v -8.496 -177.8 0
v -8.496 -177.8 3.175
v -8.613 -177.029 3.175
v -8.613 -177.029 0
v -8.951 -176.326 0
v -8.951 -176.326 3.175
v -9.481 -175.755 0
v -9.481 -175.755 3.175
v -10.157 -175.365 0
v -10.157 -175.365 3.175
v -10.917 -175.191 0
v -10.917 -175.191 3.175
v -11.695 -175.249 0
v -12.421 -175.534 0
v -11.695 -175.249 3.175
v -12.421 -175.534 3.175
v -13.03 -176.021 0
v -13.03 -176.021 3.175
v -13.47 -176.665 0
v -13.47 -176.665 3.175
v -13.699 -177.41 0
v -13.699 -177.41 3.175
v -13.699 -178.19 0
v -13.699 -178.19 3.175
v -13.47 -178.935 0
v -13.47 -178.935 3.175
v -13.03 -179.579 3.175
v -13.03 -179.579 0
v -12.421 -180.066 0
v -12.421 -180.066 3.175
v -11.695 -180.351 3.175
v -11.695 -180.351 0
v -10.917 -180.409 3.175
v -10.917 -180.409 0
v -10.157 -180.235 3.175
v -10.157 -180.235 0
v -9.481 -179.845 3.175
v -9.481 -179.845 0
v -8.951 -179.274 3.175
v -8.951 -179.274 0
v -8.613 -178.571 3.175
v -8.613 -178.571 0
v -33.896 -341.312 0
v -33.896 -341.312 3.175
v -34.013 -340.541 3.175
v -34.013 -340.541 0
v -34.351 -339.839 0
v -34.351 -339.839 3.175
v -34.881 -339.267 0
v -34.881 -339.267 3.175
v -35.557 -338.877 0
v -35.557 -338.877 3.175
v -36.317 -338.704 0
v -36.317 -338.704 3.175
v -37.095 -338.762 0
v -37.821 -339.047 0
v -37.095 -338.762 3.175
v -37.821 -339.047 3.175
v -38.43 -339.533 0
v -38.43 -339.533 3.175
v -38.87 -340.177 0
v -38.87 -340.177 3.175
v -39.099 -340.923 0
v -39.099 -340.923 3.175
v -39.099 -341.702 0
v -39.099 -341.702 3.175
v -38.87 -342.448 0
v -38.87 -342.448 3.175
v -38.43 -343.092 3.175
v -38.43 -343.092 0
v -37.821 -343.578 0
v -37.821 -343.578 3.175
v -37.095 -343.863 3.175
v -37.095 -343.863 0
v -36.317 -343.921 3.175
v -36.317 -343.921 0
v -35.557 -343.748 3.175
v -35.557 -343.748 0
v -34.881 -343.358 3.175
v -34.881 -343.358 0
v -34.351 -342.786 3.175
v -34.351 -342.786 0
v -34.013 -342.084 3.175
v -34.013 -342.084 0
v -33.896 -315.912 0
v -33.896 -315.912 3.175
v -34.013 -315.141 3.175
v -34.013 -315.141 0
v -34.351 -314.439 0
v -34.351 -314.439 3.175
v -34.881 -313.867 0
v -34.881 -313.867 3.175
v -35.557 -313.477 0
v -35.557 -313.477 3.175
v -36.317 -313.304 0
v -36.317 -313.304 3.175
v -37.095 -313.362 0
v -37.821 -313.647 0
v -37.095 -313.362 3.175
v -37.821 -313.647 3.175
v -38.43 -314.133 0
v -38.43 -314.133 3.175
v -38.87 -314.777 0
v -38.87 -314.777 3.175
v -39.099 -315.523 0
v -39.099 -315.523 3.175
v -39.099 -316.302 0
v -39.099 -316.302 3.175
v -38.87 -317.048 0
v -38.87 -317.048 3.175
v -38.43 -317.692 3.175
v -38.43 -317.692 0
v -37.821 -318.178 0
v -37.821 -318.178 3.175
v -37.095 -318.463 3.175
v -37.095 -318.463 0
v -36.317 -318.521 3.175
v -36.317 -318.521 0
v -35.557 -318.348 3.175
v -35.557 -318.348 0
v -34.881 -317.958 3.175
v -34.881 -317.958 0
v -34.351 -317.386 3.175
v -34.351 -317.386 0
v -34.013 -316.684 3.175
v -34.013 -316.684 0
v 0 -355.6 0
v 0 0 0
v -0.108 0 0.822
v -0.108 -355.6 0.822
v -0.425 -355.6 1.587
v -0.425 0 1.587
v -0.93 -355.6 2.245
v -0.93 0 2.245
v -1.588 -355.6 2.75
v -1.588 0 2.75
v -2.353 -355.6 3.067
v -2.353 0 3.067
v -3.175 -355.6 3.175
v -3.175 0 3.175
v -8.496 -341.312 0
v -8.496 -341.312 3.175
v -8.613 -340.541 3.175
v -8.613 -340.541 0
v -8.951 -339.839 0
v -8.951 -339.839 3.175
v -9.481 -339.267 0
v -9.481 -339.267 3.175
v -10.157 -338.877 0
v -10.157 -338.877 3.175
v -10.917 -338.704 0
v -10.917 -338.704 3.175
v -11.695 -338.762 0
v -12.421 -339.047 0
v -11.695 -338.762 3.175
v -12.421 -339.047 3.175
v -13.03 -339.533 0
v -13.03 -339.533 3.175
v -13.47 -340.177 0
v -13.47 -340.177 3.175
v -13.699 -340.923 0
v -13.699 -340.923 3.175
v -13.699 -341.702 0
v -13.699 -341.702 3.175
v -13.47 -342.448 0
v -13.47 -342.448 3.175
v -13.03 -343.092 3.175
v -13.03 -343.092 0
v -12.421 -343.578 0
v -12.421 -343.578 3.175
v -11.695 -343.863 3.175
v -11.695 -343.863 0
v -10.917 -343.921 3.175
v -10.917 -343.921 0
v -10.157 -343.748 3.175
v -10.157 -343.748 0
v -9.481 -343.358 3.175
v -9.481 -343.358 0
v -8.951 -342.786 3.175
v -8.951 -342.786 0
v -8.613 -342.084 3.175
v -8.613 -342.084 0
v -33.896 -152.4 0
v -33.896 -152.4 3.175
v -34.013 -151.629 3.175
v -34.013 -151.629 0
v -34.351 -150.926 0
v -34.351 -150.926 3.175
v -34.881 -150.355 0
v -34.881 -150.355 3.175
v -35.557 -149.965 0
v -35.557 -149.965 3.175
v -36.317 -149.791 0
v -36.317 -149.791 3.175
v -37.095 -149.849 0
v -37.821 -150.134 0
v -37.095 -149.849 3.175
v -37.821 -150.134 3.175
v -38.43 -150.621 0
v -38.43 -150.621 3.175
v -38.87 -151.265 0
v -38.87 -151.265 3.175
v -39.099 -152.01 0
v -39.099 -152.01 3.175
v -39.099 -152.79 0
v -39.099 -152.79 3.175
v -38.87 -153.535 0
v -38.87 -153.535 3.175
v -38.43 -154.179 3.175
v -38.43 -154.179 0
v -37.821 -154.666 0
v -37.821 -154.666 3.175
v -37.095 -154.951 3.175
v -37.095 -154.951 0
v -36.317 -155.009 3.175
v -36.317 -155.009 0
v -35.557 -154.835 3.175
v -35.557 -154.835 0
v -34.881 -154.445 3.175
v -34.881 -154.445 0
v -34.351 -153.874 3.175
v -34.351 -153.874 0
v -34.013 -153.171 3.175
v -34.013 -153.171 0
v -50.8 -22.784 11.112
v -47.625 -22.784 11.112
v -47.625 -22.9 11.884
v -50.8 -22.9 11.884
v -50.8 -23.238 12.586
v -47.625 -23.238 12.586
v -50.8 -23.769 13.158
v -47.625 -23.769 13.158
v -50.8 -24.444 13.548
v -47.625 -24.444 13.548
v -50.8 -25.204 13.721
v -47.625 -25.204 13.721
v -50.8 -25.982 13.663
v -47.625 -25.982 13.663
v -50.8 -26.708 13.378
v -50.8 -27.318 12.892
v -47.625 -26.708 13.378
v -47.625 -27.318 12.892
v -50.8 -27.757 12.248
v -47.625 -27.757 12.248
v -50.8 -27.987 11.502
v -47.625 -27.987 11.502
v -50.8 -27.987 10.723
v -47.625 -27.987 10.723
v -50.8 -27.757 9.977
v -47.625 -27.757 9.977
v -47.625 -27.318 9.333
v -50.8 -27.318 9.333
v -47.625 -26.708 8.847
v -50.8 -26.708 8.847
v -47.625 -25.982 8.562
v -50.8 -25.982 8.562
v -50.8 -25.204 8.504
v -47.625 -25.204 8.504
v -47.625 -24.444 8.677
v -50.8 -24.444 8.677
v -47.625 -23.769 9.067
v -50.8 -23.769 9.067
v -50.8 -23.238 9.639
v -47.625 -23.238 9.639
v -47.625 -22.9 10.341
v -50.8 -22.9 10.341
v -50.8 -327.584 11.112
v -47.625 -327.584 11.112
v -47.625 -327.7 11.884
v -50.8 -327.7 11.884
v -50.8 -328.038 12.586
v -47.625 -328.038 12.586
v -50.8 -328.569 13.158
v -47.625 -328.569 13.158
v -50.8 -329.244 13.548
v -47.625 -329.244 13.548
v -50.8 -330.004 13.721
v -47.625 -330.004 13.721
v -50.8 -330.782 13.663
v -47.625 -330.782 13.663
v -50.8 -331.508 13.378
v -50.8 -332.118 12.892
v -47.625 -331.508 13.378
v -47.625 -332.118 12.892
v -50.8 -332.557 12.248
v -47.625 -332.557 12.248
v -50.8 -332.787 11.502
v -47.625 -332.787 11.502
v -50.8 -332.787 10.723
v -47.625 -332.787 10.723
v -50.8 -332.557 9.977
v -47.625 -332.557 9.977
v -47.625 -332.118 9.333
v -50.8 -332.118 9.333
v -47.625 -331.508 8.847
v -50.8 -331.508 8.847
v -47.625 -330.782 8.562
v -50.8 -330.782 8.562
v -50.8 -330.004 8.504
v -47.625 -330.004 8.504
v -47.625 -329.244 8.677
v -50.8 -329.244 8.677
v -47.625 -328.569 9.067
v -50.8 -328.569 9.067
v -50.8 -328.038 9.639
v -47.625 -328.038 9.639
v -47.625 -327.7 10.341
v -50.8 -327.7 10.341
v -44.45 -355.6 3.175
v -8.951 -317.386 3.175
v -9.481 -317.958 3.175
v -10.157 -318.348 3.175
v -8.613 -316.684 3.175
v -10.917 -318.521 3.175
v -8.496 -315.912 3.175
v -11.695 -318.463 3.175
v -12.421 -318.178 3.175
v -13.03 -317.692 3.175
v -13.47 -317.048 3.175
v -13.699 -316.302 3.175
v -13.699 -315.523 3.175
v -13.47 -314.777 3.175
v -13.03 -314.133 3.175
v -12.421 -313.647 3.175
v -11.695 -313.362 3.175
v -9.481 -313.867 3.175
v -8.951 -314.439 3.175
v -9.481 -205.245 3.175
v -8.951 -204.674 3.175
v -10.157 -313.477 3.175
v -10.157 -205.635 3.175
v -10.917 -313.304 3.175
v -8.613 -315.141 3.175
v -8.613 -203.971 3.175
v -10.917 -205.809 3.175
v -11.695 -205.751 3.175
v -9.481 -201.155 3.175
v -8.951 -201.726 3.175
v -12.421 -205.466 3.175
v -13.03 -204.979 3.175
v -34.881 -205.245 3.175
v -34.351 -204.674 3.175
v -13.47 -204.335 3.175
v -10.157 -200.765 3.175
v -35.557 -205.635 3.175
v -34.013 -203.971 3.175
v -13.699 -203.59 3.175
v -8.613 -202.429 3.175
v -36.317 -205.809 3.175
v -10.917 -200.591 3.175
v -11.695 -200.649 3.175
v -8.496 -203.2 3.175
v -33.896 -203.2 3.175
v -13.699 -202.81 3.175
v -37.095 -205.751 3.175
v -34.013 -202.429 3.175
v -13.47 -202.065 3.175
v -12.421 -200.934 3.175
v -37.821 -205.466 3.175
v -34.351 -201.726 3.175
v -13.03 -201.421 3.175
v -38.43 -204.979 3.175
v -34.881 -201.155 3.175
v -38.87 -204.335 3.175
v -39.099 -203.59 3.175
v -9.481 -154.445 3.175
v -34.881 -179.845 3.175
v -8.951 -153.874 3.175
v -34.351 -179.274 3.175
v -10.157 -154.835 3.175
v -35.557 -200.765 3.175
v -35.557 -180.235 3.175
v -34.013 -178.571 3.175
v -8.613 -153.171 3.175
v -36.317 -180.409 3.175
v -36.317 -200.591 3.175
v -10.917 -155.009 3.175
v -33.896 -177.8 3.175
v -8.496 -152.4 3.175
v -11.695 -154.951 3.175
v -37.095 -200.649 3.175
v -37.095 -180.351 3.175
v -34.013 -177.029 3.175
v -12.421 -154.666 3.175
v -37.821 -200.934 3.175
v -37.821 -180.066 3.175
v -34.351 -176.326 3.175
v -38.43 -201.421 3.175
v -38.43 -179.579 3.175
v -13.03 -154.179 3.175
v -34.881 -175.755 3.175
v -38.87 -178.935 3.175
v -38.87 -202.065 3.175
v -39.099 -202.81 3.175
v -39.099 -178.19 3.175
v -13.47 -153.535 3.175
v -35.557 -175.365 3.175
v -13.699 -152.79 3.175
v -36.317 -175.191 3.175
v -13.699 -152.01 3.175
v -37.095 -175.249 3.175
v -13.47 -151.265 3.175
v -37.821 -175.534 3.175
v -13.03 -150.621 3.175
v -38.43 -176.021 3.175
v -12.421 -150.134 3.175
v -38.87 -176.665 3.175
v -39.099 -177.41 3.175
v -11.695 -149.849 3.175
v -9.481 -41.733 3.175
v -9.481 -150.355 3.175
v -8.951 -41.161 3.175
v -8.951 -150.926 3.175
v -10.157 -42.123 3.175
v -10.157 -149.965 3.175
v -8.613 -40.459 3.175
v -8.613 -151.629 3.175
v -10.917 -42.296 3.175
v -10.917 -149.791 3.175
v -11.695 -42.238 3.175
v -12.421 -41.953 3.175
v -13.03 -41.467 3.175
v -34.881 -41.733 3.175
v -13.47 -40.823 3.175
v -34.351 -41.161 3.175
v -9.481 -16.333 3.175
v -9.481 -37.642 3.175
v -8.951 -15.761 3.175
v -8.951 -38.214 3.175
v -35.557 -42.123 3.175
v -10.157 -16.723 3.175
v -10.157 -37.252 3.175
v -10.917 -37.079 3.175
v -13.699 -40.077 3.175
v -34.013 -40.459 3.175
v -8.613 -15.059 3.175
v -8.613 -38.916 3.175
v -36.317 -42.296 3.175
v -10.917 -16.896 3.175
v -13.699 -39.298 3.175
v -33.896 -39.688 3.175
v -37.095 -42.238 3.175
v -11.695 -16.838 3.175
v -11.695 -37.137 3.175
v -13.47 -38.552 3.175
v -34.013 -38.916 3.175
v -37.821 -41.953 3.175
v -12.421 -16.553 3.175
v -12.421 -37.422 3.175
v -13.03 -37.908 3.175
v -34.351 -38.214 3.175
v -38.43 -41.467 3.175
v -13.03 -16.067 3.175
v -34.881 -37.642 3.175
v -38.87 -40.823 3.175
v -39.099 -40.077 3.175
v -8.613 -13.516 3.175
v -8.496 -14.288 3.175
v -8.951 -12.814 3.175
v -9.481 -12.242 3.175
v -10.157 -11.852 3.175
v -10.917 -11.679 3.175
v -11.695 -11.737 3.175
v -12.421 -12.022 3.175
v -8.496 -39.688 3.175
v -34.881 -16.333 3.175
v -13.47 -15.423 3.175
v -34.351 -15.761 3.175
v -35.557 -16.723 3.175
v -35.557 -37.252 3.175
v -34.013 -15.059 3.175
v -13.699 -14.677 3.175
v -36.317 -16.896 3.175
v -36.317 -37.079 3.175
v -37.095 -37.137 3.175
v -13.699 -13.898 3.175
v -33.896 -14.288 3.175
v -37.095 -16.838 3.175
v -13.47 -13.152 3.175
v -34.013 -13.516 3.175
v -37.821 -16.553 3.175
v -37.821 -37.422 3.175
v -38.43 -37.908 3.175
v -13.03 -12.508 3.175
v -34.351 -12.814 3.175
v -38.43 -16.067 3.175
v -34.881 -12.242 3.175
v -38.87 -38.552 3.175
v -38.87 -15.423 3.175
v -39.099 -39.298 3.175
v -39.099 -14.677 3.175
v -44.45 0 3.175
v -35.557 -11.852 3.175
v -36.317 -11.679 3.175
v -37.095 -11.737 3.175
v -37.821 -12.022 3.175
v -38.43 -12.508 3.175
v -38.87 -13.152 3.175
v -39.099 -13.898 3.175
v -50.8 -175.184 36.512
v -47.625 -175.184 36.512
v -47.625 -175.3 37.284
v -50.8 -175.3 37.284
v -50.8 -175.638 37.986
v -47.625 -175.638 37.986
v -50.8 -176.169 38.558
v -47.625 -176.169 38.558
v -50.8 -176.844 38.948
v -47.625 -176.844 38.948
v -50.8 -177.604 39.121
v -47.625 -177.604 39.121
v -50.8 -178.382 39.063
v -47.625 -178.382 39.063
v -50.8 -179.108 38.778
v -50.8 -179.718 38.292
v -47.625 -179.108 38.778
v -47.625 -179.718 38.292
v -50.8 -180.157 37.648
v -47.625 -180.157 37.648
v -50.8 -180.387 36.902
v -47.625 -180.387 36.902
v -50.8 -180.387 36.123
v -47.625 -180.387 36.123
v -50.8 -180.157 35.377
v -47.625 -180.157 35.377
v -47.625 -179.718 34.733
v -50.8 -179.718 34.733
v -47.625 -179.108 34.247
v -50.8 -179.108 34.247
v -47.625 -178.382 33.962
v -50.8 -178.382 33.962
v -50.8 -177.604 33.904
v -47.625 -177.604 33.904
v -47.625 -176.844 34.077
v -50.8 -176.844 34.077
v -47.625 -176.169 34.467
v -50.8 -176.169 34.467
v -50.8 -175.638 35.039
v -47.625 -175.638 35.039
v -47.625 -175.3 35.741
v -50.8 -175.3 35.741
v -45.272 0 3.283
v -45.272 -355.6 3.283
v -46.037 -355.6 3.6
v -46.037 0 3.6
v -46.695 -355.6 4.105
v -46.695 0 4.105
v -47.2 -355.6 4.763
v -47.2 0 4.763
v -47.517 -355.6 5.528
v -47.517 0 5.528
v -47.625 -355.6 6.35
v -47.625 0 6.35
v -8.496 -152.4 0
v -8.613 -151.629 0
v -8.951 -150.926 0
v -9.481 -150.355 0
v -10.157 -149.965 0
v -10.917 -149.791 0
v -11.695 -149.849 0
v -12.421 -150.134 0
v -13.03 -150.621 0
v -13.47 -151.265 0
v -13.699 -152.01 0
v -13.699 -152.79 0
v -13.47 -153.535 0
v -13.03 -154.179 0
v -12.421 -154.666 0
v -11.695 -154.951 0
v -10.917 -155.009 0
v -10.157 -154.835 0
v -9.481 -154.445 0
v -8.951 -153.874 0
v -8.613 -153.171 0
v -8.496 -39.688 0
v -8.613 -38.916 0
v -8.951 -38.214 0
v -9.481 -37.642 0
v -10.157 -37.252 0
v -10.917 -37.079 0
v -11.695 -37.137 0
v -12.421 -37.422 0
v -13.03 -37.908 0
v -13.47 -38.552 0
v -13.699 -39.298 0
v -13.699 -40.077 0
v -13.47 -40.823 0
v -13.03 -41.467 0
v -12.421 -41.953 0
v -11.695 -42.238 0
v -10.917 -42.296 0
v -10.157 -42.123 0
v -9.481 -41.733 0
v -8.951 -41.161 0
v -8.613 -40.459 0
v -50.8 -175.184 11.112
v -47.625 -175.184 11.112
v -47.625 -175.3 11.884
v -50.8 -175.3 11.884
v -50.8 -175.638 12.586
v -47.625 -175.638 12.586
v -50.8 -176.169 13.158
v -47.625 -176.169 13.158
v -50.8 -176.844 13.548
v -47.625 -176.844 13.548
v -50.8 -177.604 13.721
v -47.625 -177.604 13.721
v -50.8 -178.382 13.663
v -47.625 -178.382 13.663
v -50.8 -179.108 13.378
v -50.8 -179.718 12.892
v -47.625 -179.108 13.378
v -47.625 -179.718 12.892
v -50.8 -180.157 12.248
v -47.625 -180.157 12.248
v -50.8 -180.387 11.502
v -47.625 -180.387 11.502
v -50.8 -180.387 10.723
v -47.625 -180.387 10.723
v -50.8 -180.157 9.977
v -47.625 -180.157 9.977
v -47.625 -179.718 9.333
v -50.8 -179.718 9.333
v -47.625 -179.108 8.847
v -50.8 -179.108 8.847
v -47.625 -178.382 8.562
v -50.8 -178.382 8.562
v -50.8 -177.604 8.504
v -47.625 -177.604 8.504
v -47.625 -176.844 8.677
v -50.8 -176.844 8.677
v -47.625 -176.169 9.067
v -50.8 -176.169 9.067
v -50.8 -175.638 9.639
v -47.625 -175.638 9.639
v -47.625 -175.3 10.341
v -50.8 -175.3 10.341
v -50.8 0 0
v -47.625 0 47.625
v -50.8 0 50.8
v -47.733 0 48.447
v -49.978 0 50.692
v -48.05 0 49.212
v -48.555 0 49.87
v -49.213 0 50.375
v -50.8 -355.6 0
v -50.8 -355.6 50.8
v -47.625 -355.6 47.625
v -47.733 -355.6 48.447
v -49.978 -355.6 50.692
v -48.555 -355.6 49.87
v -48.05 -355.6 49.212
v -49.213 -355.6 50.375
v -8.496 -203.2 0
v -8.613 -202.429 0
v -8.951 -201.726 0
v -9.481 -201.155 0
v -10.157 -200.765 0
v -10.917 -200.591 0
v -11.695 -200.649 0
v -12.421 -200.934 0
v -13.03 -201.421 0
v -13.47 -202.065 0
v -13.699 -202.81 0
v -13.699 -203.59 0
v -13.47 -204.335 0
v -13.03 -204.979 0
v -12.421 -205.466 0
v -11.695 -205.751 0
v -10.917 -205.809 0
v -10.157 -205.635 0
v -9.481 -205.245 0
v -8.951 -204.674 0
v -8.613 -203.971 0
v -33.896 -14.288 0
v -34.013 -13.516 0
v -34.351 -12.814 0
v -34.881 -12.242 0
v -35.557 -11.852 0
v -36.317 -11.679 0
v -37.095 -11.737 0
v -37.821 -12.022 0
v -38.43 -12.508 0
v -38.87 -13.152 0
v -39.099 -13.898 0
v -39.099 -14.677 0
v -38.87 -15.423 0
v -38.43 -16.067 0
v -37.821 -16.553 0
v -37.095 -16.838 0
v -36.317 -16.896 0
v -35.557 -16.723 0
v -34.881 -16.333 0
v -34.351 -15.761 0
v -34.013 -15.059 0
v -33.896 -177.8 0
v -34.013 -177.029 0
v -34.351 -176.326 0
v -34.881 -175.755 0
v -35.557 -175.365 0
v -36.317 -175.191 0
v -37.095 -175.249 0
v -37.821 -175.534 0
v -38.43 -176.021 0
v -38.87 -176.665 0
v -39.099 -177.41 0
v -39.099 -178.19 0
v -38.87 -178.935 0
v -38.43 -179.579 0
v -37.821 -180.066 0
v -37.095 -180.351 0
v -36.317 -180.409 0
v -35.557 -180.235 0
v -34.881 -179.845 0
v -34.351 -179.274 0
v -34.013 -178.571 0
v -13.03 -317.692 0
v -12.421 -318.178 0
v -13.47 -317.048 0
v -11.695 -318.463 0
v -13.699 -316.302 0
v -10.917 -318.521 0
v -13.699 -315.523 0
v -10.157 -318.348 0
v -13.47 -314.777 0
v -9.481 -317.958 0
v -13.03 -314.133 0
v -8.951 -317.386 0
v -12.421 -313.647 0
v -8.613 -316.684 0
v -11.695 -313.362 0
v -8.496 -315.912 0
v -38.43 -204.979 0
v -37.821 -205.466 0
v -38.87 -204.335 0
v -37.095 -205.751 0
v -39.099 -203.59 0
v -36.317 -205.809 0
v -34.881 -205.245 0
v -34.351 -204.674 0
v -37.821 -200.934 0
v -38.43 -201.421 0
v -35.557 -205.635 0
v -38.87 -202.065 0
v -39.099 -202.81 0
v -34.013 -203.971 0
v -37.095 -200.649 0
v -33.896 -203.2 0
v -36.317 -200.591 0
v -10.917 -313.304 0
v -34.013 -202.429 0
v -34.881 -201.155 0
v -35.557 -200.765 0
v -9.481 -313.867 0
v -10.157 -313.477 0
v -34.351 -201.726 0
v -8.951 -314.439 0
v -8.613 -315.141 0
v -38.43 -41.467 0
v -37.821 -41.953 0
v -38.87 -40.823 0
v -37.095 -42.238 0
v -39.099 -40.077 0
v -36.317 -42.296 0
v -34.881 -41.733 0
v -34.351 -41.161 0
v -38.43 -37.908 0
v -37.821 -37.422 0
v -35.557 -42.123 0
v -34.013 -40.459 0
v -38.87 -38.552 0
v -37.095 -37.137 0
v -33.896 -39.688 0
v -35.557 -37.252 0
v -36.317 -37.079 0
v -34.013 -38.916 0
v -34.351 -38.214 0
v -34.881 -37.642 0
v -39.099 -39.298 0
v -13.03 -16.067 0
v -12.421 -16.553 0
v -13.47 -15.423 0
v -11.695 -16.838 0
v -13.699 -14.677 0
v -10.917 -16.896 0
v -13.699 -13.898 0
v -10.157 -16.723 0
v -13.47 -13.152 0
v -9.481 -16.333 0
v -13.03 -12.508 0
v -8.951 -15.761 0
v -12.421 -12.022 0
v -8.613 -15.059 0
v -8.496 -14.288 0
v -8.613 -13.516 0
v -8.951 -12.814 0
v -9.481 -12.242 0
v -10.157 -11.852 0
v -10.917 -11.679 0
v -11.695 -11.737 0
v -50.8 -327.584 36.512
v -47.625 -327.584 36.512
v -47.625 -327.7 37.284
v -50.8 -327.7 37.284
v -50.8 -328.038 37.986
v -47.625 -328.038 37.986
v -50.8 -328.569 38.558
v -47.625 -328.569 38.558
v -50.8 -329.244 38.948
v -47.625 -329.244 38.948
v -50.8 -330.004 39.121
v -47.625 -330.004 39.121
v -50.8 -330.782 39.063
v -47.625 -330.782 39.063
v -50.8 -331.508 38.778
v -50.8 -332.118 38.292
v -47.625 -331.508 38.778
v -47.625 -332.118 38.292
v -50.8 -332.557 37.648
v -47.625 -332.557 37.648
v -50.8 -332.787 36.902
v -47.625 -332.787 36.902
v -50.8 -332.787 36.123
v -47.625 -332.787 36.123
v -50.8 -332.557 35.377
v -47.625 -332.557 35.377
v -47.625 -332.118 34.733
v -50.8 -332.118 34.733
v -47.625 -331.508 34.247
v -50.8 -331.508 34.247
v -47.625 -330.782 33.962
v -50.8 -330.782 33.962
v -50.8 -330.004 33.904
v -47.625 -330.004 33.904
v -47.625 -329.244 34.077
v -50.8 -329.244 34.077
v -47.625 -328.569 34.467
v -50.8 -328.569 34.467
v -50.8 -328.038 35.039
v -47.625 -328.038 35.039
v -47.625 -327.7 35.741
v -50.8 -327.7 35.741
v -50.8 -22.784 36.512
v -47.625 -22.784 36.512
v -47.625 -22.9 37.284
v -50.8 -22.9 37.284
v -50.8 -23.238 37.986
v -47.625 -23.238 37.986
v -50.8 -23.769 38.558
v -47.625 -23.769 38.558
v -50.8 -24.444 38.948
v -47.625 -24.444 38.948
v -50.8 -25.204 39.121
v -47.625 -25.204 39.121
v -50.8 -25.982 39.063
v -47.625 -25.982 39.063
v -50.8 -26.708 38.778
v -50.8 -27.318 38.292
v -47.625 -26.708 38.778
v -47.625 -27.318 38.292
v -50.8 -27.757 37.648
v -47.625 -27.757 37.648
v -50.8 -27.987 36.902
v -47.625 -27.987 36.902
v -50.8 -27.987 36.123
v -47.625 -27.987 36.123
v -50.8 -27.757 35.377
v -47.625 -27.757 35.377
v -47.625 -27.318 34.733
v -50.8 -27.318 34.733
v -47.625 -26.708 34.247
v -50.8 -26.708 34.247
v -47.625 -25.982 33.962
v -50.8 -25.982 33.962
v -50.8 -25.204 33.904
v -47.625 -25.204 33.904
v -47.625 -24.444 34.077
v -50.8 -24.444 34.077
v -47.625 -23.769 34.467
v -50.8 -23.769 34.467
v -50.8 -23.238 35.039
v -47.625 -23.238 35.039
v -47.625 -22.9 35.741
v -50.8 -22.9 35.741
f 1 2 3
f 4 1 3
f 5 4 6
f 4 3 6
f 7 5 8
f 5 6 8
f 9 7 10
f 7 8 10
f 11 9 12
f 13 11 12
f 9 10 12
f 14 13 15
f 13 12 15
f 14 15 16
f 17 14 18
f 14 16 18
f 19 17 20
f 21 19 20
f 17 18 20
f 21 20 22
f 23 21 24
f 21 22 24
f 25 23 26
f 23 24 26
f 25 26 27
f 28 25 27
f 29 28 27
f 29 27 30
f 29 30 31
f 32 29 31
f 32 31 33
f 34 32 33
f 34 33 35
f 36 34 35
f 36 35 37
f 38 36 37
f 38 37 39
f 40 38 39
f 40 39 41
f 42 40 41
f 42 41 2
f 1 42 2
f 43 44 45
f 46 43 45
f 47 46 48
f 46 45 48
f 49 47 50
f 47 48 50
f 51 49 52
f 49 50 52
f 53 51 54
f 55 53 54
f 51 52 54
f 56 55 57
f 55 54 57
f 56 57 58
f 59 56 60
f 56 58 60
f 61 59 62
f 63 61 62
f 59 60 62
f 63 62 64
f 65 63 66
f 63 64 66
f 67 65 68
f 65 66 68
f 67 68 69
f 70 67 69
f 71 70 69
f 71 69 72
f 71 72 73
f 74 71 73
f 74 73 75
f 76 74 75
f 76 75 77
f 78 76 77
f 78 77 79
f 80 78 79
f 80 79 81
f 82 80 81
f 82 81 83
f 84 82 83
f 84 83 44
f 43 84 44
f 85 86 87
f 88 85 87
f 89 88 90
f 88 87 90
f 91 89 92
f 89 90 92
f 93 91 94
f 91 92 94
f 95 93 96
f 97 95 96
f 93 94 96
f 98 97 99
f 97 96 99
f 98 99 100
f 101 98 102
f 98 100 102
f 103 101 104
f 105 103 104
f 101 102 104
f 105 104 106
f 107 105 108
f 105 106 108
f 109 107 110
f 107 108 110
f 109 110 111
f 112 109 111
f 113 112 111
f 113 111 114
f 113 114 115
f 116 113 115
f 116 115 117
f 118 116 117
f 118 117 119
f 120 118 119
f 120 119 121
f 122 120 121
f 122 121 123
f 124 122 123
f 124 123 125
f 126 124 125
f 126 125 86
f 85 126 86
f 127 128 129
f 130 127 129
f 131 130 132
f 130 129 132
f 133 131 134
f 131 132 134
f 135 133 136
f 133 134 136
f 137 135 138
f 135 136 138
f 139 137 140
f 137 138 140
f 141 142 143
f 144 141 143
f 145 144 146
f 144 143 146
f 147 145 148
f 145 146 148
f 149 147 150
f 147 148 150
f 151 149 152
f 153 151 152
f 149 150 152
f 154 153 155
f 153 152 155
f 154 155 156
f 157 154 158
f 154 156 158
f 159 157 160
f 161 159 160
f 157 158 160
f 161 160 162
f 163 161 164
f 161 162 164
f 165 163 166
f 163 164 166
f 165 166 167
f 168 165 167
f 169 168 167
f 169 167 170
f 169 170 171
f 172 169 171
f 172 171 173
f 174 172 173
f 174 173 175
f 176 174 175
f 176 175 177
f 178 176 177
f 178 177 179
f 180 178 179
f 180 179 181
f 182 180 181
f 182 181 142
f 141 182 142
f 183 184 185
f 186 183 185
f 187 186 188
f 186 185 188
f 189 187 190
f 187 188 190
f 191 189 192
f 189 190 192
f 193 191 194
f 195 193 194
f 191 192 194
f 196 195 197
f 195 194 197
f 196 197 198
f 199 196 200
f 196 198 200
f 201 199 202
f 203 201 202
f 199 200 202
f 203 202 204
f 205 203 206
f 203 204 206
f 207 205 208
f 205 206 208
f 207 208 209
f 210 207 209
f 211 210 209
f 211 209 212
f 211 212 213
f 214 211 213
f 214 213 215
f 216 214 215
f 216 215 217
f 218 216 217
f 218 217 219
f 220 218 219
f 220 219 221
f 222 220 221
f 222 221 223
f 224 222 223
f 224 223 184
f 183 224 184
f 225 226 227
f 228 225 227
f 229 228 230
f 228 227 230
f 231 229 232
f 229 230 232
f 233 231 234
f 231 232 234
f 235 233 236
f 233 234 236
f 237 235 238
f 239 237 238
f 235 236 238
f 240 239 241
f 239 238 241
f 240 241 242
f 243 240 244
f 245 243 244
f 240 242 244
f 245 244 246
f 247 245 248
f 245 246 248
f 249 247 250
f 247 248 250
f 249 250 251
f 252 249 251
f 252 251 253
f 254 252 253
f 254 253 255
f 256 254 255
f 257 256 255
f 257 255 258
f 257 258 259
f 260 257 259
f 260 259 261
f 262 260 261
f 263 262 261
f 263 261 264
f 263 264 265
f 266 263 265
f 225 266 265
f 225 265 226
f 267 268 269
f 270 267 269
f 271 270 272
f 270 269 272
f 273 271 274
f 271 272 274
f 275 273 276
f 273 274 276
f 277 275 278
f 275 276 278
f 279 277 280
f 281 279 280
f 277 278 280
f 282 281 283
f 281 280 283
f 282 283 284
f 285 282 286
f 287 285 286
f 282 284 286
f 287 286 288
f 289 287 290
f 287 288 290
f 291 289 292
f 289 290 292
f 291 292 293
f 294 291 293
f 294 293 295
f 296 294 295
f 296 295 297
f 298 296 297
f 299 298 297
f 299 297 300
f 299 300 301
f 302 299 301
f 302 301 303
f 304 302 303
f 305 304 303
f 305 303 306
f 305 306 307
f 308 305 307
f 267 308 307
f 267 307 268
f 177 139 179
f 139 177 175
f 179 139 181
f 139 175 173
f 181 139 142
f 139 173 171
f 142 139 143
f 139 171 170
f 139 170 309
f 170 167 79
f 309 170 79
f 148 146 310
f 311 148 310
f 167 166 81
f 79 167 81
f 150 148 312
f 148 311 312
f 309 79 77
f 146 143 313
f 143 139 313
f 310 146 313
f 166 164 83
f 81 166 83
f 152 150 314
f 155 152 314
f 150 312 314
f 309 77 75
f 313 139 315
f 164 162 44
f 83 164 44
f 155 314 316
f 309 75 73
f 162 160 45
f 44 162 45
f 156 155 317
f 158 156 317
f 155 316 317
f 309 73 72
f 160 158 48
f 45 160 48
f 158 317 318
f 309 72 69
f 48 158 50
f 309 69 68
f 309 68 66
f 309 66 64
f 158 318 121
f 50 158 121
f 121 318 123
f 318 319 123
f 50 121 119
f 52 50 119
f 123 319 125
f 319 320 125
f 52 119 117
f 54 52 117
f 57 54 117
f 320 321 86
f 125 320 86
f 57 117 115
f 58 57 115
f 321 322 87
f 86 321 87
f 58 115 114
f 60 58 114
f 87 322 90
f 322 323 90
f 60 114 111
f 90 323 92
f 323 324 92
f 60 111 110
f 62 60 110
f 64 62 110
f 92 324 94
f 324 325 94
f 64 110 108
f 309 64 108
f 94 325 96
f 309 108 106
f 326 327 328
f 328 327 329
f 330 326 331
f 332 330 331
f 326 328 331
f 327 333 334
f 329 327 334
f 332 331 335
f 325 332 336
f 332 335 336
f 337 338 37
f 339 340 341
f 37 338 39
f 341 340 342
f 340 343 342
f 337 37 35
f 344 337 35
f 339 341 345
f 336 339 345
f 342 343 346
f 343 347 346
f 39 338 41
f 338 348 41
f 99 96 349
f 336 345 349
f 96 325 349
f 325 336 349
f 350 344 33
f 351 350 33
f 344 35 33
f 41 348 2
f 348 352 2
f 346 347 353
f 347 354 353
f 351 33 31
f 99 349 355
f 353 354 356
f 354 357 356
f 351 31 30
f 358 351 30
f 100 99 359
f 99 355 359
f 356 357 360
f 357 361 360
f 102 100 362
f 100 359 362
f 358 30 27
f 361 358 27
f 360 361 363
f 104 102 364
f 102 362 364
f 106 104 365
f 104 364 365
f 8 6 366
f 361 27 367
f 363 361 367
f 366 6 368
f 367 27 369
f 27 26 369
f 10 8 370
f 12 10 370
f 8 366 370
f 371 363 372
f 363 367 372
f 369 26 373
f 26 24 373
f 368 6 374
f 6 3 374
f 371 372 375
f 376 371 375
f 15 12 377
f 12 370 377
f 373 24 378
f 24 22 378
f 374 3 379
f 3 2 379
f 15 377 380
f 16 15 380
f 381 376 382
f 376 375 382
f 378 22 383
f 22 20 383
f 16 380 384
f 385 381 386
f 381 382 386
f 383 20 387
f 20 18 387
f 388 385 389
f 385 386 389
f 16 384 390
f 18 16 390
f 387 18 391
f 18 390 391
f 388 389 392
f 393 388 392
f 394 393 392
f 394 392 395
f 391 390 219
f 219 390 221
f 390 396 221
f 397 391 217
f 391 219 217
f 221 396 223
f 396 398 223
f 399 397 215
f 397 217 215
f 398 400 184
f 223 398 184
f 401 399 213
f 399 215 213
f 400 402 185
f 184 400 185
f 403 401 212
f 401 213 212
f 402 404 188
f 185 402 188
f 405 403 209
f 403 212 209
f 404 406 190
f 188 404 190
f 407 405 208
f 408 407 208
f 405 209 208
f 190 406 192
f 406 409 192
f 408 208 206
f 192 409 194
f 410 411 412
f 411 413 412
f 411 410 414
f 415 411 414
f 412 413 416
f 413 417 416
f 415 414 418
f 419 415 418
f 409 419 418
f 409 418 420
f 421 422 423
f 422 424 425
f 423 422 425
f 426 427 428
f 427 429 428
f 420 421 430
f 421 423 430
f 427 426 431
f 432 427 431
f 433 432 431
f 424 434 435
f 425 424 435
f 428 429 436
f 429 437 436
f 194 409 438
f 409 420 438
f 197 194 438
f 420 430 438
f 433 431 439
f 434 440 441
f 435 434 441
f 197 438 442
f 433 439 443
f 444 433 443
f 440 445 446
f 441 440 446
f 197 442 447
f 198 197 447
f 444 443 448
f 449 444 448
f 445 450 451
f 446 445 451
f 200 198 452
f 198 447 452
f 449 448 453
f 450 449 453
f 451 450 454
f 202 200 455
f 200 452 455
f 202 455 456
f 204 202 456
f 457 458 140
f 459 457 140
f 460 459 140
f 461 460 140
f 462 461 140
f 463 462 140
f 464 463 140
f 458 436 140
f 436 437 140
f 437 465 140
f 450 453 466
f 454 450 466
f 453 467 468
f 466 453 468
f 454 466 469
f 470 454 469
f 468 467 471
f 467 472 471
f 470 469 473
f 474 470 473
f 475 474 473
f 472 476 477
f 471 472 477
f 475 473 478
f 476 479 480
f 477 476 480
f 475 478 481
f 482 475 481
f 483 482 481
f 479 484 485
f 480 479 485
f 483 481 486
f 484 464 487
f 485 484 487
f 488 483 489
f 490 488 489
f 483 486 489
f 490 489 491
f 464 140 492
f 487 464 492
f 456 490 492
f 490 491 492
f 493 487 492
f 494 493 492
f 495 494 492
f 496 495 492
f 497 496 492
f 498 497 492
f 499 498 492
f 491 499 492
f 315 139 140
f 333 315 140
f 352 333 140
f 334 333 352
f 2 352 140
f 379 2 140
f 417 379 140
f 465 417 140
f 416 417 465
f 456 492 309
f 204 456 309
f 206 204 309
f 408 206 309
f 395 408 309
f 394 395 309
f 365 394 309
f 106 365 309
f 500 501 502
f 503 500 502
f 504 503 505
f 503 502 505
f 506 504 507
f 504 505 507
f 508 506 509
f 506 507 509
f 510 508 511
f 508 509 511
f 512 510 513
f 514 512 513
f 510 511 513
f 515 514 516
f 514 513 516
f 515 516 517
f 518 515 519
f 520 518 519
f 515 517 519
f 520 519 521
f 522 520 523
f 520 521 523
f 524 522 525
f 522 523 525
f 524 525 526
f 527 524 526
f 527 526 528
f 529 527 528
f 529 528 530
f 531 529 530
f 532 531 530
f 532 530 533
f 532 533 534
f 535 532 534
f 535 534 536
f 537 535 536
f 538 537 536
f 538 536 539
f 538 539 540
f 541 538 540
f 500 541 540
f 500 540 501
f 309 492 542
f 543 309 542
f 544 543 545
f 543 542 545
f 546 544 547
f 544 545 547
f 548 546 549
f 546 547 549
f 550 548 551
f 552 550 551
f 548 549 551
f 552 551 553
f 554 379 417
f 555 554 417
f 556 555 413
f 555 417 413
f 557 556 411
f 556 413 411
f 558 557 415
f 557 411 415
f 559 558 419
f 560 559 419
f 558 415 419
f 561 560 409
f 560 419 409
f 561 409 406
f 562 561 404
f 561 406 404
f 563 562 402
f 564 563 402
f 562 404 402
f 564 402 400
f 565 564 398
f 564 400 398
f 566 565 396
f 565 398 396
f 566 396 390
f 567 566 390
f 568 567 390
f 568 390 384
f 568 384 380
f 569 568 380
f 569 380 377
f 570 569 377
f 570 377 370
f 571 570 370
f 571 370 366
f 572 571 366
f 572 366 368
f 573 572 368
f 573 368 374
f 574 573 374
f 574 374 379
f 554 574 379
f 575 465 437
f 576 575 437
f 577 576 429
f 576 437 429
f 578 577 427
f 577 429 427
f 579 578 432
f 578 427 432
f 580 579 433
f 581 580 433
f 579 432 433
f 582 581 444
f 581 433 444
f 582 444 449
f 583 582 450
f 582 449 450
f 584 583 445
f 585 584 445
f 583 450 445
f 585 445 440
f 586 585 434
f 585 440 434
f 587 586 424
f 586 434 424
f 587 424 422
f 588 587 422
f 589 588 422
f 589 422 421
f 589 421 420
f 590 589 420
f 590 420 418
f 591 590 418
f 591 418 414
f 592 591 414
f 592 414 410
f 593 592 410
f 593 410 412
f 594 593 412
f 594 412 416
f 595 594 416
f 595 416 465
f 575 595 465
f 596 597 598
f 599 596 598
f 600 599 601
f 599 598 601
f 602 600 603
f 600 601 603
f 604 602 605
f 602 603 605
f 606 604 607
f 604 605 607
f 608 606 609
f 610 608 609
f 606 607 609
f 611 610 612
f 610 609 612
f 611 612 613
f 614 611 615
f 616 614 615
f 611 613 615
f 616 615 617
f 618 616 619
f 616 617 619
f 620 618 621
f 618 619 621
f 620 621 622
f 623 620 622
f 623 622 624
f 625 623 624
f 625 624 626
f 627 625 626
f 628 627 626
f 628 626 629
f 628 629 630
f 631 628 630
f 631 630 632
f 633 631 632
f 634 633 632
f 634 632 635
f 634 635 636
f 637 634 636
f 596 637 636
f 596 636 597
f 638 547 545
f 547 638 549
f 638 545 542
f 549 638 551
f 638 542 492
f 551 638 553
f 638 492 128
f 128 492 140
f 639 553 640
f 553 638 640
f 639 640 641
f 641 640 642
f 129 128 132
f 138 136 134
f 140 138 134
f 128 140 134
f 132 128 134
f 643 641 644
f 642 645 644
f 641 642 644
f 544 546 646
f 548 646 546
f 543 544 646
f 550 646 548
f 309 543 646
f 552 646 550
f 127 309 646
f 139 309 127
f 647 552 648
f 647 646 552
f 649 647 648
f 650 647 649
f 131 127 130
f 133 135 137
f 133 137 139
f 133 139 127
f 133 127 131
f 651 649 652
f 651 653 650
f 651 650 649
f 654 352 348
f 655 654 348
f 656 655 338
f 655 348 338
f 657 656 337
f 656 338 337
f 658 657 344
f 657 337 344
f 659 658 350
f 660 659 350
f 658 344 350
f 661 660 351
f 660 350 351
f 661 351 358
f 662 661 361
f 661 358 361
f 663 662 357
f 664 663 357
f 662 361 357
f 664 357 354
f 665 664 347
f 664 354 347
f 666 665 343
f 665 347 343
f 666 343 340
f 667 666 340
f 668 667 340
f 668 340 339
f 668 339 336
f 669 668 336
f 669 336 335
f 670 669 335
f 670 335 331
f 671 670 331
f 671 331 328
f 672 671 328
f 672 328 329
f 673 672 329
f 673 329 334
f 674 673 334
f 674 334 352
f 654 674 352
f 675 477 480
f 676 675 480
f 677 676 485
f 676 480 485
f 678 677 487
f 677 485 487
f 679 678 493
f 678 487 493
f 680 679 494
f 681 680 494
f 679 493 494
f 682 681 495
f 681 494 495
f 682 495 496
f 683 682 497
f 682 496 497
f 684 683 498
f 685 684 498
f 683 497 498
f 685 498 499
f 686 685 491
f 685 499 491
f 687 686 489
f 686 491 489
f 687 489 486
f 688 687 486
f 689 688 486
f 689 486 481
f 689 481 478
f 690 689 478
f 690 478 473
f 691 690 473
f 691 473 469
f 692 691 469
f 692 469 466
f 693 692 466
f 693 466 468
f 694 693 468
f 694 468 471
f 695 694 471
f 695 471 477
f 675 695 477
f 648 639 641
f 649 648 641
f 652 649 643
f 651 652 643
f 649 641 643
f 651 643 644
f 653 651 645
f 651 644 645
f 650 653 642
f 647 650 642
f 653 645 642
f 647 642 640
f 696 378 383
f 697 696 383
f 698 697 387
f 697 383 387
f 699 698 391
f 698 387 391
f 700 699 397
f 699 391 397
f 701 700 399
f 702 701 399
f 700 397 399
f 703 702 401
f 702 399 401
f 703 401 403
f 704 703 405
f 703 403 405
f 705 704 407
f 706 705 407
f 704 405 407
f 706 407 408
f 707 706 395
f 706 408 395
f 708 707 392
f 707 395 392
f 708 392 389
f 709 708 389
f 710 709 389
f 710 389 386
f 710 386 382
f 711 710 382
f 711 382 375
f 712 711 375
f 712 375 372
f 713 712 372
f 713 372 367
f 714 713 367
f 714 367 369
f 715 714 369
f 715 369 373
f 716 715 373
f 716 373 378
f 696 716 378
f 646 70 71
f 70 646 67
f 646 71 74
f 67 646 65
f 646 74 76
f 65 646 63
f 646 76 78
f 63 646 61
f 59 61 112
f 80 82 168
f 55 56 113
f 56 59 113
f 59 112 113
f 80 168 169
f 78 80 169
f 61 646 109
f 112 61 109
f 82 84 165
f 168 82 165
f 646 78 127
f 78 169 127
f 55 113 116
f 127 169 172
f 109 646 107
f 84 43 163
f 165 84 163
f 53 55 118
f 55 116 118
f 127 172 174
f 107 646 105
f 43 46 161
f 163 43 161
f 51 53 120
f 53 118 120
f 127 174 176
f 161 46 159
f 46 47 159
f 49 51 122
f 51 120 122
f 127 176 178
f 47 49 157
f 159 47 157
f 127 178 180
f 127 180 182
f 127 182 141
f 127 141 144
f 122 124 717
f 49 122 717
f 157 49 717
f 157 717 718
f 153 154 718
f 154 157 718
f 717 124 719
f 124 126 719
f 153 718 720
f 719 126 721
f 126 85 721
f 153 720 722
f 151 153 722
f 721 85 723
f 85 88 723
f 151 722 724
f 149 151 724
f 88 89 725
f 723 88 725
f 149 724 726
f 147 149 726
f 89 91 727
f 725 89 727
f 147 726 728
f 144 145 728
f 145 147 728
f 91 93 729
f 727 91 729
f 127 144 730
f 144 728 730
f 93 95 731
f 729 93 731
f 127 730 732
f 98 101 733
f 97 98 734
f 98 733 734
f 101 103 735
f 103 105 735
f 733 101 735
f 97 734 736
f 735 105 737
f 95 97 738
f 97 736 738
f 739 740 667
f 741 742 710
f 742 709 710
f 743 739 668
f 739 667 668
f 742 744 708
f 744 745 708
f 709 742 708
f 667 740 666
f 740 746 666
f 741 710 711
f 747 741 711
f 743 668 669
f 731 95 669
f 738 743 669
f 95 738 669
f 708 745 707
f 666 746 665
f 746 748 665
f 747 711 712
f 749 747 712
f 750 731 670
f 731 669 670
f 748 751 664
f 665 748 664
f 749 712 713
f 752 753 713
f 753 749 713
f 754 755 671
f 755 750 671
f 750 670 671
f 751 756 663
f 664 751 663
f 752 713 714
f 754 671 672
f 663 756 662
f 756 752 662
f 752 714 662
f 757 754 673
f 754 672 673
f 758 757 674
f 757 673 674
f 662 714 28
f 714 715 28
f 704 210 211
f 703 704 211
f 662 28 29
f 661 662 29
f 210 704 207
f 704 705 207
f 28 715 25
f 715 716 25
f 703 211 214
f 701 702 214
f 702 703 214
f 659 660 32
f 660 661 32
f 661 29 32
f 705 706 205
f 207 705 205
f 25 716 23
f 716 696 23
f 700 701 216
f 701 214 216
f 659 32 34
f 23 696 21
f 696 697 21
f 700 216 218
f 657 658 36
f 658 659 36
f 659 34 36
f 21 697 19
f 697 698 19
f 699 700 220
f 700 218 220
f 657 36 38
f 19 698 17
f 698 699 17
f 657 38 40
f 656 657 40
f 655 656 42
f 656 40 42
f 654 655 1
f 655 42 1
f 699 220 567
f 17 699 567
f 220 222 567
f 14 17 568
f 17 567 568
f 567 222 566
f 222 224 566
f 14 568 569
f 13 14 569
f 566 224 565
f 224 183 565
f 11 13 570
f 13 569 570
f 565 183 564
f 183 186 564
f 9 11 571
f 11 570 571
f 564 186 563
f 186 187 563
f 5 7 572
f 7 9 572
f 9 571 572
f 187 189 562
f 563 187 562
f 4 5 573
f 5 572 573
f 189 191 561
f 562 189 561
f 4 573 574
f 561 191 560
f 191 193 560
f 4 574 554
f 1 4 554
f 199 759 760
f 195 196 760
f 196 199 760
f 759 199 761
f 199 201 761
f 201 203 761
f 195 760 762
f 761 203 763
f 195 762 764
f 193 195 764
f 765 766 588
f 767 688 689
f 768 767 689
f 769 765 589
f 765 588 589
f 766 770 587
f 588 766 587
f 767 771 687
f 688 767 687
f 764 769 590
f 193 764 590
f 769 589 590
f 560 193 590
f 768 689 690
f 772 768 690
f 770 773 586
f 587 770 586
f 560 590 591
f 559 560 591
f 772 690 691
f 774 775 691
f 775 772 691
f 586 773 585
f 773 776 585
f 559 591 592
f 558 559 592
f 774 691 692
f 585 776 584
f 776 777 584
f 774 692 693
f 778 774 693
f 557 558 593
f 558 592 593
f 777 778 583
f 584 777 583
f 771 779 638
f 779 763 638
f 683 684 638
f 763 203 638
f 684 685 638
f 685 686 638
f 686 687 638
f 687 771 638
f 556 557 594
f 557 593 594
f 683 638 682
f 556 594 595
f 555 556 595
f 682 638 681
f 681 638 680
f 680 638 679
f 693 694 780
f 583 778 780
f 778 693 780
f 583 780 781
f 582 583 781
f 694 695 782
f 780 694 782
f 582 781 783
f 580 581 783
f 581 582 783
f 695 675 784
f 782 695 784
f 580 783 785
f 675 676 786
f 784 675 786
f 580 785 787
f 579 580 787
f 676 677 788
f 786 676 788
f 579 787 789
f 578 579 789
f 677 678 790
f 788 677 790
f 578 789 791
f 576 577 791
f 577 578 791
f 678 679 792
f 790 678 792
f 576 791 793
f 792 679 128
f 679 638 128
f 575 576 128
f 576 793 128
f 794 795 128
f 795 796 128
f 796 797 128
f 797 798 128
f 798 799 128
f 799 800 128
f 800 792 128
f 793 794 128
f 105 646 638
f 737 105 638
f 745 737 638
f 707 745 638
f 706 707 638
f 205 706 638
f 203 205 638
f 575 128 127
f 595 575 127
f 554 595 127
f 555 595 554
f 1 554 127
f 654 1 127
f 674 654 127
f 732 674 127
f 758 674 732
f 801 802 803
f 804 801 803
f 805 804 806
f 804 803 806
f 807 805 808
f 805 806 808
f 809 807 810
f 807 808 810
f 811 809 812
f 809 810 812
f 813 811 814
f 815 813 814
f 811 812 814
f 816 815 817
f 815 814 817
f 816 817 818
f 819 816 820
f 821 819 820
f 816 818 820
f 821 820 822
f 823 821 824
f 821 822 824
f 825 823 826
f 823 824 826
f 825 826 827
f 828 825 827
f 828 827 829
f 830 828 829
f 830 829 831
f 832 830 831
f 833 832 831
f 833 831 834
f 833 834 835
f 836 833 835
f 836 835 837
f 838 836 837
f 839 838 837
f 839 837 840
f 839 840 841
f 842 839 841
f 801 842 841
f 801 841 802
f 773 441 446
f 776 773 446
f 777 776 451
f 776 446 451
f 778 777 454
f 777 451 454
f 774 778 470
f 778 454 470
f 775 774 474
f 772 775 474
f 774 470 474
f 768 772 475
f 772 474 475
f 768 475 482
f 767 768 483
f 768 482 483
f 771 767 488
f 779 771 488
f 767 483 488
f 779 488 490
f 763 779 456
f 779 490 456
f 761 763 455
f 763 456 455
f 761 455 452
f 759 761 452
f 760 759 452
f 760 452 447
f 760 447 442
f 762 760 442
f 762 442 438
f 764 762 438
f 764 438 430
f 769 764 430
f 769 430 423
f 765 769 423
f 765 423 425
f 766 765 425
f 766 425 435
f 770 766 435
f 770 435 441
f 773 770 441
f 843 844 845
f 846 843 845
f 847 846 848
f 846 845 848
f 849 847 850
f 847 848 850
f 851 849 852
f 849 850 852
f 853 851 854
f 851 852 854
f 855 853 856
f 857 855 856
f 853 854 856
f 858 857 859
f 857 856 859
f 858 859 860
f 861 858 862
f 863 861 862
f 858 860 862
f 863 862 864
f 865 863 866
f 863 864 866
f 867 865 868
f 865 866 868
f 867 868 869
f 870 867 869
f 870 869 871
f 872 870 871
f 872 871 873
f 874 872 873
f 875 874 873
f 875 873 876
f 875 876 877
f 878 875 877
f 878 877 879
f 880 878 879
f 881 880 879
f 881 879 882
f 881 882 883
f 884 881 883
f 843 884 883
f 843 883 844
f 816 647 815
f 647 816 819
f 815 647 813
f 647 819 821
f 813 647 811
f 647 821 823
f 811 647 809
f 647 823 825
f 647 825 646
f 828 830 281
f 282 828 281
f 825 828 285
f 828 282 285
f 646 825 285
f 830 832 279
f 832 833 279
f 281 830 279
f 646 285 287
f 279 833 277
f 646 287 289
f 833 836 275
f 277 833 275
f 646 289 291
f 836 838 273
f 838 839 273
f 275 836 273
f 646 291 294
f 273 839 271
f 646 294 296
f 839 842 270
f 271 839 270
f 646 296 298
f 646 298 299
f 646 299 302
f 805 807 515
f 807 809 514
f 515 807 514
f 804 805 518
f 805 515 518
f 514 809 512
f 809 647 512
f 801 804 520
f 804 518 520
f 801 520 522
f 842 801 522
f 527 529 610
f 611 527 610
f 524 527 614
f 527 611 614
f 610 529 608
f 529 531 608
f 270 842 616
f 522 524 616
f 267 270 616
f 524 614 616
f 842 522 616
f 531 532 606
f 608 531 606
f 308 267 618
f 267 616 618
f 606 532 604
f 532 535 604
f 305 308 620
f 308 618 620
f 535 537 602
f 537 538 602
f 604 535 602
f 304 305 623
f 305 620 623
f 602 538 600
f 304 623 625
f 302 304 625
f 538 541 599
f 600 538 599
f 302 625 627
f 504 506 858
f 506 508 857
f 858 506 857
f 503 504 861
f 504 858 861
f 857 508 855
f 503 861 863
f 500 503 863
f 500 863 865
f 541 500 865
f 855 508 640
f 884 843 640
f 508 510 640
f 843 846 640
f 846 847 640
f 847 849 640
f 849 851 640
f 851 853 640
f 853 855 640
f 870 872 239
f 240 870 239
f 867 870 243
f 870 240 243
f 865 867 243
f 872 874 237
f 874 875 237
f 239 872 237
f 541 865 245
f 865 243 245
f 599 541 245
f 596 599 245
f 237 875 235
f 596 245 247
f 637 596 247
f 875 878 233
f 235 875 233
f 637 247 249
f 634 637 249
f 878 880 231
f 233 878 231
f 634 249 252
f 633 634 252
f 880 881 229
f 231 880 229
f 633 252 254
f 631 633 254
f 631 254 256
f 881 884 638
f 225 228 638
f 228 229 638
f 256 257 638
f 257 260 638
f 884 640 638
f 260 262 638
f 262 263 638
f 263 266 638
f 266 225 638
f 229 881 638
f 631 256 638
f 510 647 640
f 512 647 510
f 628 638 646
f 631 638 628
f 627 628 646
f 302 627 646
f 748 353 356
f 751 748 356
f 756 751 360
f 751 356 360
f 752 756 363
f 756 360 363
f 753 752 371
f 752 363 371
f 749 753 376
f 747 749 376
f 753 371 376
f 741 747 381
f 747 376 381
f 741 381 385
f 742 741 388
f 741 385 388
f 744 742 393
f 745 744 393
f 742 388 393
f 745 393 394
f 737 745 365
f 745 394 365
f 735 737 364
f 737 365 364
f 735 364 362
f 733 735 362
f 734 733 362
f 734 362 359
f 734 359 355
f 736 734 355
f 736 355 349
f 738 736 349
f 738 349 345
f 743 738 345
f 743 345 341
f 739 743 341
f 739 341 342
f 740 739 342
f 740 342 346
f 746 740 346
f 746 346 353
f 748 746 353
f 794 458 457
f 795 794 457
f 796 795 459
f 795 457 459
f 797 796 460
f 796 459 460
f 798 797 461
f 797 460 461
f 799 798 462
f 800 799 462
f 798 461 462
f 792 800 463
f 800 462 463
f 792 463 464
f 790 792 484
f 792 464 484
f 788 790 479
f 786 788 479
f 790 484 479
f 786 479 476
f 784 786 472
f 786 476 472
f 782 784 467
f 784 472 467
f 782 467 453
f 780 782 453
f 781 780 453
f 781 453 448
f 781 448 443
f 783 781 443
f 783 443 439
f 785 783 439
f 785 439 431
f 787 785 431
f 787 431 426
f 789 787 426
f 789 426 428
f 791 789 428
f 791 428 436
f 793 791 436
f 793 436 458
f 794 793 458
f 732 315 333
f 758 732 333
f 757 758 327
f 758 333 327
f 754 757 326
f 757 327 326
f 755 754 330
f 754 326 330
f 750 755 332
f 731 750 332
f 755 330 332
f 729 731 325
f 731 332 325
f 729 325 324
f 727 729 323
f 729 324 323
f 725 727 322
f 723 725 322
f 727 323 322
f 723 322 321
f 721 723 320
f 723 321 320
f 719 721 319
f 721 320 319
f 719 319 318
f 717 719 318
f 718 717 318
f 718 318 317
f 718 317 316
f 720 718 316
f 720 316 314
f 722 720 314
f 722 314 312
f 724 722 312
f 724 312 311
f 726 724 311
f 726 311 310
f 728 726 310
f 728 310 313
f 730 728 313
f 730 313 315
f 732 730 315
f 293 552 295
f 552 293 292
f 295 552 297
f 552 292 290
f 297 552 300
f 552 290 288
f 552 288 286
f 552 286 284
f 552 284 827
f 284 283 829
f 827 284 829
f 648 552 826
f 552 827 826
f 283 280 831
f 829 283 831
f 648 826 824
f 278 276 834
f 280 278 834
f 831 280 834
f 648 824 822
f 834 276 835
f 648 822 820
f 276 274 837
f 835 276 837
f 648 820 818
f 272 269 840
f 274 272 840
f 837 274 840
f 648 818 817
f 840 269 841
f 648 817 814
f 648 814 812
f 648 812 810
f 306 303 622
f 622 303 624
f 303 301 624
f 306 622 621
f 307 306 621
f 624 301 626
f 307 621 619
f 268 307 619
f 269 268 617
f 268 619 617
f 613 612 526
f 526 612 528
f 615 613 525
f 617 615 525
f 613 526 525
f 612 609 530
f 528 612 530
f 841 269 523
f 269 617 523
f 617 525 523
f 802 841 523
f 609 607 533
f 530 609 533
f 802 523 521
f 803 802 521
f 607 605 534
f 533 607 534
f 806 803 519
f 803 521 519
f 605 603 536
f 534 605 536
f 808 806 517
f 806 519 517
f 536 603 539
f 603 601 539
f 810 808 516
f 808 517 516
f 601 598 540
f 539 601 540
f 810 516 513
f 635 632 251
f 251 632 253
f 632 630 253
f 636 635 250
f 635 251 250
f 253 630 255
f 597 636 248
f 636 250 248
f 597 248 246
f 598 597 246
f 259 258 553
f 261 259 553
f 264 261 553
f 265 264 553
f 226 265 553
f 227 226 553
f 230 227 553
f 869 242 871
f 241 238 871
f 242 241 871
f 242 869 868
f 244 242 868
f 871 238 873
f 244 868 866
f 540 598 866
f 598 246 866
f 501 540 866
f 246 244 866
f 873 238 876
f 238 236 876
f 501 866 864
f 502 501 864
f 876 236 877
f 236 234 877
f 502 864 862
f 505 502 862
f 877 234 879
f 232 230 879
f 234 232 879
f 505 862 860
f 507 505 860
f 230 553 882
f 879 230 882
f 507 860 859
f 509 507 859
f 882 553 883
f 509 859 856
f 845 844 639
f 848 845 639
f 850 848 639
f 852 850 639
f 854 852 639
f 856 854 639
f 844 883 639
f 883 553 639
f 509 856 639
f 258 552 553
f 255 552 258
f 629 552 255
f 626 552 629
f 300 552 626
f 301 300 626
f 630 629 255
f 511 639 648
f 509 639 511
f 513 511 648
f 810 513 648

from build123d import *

# Parameters (mm, degrees)
F1_DEPTH = 355.6
F2_R     = 2.6162
F3_DEPTH = 3.176
F4_R     = 2.6162
F5_DEPTH = 3.176


with BuildPart() as f1:
    # F0 (on Front) → F1 (new body)
    with BuildSketch(Plane.XZ):
        with BuildLine():
            Line((-50.8, 0), (0, 0))
            ThreePointArc((0, 0), (-0.929936, 2.245064), (-3.175, 3.175))
            Line((-3.175, 3.175), (-44.45, 3.175))
            ThreePointArc((-44.45, 3.175), (-46.695064, 4.104936), (-47.625, 6.35))
            Line((-47.625, 6.35), (-47.625, 47.625))
            ThreePointArc((-47.625, 47.625), (-48.554936, 49.870064), (-50.8, 50.8))
            Line((-50.8, 50.8), (-50.8, 0))
        make_face()
    extrude(amount=F1_DEPTH)

    # F2 (on face) → F3 (cut, through all)
    with BuildSketch(Plane.YZ.offset(-47.625)):
        with Locations((-330.2, 11.1125)):
            Circle(F2_R)
        with Locations((-177.8, 11.1125)):
            Circle(F2_R)
        with Locations((-25.4, 11.1125)):
            Circle(F2_R)
        with Locations((-330.2, 36.5125)):
            Circle(F2_R)
        with Locations((-177.8, 36.5125)):
            Circle(F2_R)
        with Locations((-25.4, 36.5125)):
            Circle(F2_R)
    extrude(amount=-F3_DEPTH, mode=Mode.SUBTRACT)

    # F4 (on face) → F5 (cut, through all)
    with BuildSketch(Plane.XY.offset(3.175)):
        with Locations((-36.5125, -341.3125)):
            Circle(F4_R)
        with Locations((-36.5125, -14.2875)):
            Circle(F4_R)
        with Locations((-36.5125, -177.8)):
            Circle(F4_R)
        with Locations((-11.1125, -341.3125)):
            Circle(F4_R)
        with Locations((-11.1125, -177.8)):
            Circle(F4_R)
        with Locations((-11.1125, -14.2875)):
            Circle(F4_R)
        with Locations((-36.5125, -203.2)):
            Circle(F4_R)
        with Locations((-11.1125, -203.2)):
            Circle(F4_R)
        with Locations((-36.5125, -152.4)):
            Circle(F4_R)
        with Locations((-11.1125, -152.4)):
            Circle(F4_R)
        with Locations((-11.1125, -39.6875)):
            Circle(F4_R)
        with Locations((-36.5125, -39.6875)):
            Circle(F4_R)
        with Locations((-11.1125, -315.9125)):
            Circle(F4_R)
        with Locations((-36.5125, -315.9125)):
            Circle(F4_R)
    extrude(amount=-F5_DEPTH, mode=Mode.SUBTRACT)


solid = f1.part
